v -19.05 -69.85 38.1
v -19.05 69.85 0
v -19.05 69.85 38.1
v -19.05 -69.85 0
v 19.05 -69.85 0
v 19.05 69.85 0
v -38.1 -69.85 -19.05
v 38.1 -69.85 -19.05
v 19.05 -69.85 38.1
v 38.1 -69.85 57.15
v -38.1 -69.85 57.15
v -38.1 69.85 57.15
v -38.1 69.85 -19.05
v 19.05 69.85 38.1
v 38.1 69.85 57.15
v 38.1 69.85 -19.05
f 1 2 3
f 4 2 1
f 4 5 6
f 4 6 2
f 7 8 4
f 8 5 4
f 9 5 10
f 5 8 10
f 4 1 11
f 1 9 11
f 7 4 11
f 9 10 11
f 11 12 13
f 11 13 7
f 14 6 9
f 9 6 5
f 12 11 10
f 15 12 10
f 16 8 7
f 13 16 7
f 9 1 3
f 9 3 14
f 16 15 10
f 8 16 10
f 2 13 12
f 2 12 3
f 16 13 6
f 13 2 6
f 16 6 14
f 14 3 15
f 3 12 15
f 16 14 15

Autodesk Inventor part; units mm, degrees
ref_plane "YZ Plane" through (0, 0, 0) normal (1, 0, 0) x (0, 1, 0)
ref_plane "XZ Plane" through (0, 0, 0) normal (0, 1, 0) x (-1, 0, 0)
ref_plane "XY Plane" through (0, 0, 0) normal (0, 0, 1) x (1, 0, 0)
sketch "Sketch1" plane through (0, 0, 0) normal (0, 0, 1) x (1, 0, 0)
  line L0 (-38.1, -69.85) -> (38.1, -69.85)
  line L1 (38.1, -69.85) -> (38.1, 69.85)
  line L2 (38.1, 69.85) -> (-38.1, 69.85)
  line L3 (-38.1, 69.85) -> (-38.1, -69.85)
  line L4 (19.05, 69.85) -> (19.05, -69.85)
  line L5 (-19.05, 69.85) -> (-19.05, -69.85)
  line L6 (-19.05, 69.85) -> (19.05, 69.85)
  point P0 (0, 0)
  point P1 (38.1, 6.35)
  point P2 (-38.1, -57.15)
  point P3 (38.1, 57.15)
  point P4 (-38.1, -6.35)
  point P5 (0, 69.85)
  dimension "d0" = 139.7
  dimension "d1" = 76.2
  dimension "d13" = 38.1
extrude "Extrusion1" add sketch "Sketch1" along normal blind 38.1 contours L3 L2 L5 L0 | L4 L2 L1 L0
sketch "Sketch2" plane through (0, 0, 38.1) normal (0, 0, 1) x (1, 0, 0)
  line L0 (-38.1, 69.85) -> (-38.1, -69.85) projected
  line L1 (38.1, -69.85) -> (-38.1, -69.85)
  line L2 (-38.1, -69.85) -> (-38.1, 69.85)
  line L3 (-38.1, 69.85) -> (38.1, 69.85)
  line L4 (38.1, 69.85) -> (38.1, -69.85)
  line L5 (38.1, -69.85) -> (-38.1, 69.85) construction
  line L6 (-38.1, -69.85) -> (38.1, 69.85) construction
  point P0 (0, 0)
  point P1 (-38.1, 0)
extrude "Extrusion2" add sketch "Sketch2" along normal blind 19.05
sketch "Sketch3" plane through (0, 0, 0) normal (0, 0, -1) x (-1, 0, 0)
  line L0 (38.1, 69.85) -> (38.1, -69.85) projected
  line L1 (-38.1, -69.85) -> (38.1, -69.85)
  line L2 (38.1, -69.85) -> (38.1, 69.85)
  line L3 (38.1, 69.85) -> (-38.1, 69.85)
  line L4 (-38.1, 69.85) -> (-38.1, -69.85)
  line L5 (-38.1, -69.85) -> (38.1, 69.85) construction
  line L6 (38.1, -69.85) -> (-38.1, 69.85) construction
  point P0 (0, 0)
  point P1 (38.1, 0)
extrude "Extrusion3" add sketch "Sketch3" along normal blind 19.05
properties part number "hollow monitor support (for assembly)"
